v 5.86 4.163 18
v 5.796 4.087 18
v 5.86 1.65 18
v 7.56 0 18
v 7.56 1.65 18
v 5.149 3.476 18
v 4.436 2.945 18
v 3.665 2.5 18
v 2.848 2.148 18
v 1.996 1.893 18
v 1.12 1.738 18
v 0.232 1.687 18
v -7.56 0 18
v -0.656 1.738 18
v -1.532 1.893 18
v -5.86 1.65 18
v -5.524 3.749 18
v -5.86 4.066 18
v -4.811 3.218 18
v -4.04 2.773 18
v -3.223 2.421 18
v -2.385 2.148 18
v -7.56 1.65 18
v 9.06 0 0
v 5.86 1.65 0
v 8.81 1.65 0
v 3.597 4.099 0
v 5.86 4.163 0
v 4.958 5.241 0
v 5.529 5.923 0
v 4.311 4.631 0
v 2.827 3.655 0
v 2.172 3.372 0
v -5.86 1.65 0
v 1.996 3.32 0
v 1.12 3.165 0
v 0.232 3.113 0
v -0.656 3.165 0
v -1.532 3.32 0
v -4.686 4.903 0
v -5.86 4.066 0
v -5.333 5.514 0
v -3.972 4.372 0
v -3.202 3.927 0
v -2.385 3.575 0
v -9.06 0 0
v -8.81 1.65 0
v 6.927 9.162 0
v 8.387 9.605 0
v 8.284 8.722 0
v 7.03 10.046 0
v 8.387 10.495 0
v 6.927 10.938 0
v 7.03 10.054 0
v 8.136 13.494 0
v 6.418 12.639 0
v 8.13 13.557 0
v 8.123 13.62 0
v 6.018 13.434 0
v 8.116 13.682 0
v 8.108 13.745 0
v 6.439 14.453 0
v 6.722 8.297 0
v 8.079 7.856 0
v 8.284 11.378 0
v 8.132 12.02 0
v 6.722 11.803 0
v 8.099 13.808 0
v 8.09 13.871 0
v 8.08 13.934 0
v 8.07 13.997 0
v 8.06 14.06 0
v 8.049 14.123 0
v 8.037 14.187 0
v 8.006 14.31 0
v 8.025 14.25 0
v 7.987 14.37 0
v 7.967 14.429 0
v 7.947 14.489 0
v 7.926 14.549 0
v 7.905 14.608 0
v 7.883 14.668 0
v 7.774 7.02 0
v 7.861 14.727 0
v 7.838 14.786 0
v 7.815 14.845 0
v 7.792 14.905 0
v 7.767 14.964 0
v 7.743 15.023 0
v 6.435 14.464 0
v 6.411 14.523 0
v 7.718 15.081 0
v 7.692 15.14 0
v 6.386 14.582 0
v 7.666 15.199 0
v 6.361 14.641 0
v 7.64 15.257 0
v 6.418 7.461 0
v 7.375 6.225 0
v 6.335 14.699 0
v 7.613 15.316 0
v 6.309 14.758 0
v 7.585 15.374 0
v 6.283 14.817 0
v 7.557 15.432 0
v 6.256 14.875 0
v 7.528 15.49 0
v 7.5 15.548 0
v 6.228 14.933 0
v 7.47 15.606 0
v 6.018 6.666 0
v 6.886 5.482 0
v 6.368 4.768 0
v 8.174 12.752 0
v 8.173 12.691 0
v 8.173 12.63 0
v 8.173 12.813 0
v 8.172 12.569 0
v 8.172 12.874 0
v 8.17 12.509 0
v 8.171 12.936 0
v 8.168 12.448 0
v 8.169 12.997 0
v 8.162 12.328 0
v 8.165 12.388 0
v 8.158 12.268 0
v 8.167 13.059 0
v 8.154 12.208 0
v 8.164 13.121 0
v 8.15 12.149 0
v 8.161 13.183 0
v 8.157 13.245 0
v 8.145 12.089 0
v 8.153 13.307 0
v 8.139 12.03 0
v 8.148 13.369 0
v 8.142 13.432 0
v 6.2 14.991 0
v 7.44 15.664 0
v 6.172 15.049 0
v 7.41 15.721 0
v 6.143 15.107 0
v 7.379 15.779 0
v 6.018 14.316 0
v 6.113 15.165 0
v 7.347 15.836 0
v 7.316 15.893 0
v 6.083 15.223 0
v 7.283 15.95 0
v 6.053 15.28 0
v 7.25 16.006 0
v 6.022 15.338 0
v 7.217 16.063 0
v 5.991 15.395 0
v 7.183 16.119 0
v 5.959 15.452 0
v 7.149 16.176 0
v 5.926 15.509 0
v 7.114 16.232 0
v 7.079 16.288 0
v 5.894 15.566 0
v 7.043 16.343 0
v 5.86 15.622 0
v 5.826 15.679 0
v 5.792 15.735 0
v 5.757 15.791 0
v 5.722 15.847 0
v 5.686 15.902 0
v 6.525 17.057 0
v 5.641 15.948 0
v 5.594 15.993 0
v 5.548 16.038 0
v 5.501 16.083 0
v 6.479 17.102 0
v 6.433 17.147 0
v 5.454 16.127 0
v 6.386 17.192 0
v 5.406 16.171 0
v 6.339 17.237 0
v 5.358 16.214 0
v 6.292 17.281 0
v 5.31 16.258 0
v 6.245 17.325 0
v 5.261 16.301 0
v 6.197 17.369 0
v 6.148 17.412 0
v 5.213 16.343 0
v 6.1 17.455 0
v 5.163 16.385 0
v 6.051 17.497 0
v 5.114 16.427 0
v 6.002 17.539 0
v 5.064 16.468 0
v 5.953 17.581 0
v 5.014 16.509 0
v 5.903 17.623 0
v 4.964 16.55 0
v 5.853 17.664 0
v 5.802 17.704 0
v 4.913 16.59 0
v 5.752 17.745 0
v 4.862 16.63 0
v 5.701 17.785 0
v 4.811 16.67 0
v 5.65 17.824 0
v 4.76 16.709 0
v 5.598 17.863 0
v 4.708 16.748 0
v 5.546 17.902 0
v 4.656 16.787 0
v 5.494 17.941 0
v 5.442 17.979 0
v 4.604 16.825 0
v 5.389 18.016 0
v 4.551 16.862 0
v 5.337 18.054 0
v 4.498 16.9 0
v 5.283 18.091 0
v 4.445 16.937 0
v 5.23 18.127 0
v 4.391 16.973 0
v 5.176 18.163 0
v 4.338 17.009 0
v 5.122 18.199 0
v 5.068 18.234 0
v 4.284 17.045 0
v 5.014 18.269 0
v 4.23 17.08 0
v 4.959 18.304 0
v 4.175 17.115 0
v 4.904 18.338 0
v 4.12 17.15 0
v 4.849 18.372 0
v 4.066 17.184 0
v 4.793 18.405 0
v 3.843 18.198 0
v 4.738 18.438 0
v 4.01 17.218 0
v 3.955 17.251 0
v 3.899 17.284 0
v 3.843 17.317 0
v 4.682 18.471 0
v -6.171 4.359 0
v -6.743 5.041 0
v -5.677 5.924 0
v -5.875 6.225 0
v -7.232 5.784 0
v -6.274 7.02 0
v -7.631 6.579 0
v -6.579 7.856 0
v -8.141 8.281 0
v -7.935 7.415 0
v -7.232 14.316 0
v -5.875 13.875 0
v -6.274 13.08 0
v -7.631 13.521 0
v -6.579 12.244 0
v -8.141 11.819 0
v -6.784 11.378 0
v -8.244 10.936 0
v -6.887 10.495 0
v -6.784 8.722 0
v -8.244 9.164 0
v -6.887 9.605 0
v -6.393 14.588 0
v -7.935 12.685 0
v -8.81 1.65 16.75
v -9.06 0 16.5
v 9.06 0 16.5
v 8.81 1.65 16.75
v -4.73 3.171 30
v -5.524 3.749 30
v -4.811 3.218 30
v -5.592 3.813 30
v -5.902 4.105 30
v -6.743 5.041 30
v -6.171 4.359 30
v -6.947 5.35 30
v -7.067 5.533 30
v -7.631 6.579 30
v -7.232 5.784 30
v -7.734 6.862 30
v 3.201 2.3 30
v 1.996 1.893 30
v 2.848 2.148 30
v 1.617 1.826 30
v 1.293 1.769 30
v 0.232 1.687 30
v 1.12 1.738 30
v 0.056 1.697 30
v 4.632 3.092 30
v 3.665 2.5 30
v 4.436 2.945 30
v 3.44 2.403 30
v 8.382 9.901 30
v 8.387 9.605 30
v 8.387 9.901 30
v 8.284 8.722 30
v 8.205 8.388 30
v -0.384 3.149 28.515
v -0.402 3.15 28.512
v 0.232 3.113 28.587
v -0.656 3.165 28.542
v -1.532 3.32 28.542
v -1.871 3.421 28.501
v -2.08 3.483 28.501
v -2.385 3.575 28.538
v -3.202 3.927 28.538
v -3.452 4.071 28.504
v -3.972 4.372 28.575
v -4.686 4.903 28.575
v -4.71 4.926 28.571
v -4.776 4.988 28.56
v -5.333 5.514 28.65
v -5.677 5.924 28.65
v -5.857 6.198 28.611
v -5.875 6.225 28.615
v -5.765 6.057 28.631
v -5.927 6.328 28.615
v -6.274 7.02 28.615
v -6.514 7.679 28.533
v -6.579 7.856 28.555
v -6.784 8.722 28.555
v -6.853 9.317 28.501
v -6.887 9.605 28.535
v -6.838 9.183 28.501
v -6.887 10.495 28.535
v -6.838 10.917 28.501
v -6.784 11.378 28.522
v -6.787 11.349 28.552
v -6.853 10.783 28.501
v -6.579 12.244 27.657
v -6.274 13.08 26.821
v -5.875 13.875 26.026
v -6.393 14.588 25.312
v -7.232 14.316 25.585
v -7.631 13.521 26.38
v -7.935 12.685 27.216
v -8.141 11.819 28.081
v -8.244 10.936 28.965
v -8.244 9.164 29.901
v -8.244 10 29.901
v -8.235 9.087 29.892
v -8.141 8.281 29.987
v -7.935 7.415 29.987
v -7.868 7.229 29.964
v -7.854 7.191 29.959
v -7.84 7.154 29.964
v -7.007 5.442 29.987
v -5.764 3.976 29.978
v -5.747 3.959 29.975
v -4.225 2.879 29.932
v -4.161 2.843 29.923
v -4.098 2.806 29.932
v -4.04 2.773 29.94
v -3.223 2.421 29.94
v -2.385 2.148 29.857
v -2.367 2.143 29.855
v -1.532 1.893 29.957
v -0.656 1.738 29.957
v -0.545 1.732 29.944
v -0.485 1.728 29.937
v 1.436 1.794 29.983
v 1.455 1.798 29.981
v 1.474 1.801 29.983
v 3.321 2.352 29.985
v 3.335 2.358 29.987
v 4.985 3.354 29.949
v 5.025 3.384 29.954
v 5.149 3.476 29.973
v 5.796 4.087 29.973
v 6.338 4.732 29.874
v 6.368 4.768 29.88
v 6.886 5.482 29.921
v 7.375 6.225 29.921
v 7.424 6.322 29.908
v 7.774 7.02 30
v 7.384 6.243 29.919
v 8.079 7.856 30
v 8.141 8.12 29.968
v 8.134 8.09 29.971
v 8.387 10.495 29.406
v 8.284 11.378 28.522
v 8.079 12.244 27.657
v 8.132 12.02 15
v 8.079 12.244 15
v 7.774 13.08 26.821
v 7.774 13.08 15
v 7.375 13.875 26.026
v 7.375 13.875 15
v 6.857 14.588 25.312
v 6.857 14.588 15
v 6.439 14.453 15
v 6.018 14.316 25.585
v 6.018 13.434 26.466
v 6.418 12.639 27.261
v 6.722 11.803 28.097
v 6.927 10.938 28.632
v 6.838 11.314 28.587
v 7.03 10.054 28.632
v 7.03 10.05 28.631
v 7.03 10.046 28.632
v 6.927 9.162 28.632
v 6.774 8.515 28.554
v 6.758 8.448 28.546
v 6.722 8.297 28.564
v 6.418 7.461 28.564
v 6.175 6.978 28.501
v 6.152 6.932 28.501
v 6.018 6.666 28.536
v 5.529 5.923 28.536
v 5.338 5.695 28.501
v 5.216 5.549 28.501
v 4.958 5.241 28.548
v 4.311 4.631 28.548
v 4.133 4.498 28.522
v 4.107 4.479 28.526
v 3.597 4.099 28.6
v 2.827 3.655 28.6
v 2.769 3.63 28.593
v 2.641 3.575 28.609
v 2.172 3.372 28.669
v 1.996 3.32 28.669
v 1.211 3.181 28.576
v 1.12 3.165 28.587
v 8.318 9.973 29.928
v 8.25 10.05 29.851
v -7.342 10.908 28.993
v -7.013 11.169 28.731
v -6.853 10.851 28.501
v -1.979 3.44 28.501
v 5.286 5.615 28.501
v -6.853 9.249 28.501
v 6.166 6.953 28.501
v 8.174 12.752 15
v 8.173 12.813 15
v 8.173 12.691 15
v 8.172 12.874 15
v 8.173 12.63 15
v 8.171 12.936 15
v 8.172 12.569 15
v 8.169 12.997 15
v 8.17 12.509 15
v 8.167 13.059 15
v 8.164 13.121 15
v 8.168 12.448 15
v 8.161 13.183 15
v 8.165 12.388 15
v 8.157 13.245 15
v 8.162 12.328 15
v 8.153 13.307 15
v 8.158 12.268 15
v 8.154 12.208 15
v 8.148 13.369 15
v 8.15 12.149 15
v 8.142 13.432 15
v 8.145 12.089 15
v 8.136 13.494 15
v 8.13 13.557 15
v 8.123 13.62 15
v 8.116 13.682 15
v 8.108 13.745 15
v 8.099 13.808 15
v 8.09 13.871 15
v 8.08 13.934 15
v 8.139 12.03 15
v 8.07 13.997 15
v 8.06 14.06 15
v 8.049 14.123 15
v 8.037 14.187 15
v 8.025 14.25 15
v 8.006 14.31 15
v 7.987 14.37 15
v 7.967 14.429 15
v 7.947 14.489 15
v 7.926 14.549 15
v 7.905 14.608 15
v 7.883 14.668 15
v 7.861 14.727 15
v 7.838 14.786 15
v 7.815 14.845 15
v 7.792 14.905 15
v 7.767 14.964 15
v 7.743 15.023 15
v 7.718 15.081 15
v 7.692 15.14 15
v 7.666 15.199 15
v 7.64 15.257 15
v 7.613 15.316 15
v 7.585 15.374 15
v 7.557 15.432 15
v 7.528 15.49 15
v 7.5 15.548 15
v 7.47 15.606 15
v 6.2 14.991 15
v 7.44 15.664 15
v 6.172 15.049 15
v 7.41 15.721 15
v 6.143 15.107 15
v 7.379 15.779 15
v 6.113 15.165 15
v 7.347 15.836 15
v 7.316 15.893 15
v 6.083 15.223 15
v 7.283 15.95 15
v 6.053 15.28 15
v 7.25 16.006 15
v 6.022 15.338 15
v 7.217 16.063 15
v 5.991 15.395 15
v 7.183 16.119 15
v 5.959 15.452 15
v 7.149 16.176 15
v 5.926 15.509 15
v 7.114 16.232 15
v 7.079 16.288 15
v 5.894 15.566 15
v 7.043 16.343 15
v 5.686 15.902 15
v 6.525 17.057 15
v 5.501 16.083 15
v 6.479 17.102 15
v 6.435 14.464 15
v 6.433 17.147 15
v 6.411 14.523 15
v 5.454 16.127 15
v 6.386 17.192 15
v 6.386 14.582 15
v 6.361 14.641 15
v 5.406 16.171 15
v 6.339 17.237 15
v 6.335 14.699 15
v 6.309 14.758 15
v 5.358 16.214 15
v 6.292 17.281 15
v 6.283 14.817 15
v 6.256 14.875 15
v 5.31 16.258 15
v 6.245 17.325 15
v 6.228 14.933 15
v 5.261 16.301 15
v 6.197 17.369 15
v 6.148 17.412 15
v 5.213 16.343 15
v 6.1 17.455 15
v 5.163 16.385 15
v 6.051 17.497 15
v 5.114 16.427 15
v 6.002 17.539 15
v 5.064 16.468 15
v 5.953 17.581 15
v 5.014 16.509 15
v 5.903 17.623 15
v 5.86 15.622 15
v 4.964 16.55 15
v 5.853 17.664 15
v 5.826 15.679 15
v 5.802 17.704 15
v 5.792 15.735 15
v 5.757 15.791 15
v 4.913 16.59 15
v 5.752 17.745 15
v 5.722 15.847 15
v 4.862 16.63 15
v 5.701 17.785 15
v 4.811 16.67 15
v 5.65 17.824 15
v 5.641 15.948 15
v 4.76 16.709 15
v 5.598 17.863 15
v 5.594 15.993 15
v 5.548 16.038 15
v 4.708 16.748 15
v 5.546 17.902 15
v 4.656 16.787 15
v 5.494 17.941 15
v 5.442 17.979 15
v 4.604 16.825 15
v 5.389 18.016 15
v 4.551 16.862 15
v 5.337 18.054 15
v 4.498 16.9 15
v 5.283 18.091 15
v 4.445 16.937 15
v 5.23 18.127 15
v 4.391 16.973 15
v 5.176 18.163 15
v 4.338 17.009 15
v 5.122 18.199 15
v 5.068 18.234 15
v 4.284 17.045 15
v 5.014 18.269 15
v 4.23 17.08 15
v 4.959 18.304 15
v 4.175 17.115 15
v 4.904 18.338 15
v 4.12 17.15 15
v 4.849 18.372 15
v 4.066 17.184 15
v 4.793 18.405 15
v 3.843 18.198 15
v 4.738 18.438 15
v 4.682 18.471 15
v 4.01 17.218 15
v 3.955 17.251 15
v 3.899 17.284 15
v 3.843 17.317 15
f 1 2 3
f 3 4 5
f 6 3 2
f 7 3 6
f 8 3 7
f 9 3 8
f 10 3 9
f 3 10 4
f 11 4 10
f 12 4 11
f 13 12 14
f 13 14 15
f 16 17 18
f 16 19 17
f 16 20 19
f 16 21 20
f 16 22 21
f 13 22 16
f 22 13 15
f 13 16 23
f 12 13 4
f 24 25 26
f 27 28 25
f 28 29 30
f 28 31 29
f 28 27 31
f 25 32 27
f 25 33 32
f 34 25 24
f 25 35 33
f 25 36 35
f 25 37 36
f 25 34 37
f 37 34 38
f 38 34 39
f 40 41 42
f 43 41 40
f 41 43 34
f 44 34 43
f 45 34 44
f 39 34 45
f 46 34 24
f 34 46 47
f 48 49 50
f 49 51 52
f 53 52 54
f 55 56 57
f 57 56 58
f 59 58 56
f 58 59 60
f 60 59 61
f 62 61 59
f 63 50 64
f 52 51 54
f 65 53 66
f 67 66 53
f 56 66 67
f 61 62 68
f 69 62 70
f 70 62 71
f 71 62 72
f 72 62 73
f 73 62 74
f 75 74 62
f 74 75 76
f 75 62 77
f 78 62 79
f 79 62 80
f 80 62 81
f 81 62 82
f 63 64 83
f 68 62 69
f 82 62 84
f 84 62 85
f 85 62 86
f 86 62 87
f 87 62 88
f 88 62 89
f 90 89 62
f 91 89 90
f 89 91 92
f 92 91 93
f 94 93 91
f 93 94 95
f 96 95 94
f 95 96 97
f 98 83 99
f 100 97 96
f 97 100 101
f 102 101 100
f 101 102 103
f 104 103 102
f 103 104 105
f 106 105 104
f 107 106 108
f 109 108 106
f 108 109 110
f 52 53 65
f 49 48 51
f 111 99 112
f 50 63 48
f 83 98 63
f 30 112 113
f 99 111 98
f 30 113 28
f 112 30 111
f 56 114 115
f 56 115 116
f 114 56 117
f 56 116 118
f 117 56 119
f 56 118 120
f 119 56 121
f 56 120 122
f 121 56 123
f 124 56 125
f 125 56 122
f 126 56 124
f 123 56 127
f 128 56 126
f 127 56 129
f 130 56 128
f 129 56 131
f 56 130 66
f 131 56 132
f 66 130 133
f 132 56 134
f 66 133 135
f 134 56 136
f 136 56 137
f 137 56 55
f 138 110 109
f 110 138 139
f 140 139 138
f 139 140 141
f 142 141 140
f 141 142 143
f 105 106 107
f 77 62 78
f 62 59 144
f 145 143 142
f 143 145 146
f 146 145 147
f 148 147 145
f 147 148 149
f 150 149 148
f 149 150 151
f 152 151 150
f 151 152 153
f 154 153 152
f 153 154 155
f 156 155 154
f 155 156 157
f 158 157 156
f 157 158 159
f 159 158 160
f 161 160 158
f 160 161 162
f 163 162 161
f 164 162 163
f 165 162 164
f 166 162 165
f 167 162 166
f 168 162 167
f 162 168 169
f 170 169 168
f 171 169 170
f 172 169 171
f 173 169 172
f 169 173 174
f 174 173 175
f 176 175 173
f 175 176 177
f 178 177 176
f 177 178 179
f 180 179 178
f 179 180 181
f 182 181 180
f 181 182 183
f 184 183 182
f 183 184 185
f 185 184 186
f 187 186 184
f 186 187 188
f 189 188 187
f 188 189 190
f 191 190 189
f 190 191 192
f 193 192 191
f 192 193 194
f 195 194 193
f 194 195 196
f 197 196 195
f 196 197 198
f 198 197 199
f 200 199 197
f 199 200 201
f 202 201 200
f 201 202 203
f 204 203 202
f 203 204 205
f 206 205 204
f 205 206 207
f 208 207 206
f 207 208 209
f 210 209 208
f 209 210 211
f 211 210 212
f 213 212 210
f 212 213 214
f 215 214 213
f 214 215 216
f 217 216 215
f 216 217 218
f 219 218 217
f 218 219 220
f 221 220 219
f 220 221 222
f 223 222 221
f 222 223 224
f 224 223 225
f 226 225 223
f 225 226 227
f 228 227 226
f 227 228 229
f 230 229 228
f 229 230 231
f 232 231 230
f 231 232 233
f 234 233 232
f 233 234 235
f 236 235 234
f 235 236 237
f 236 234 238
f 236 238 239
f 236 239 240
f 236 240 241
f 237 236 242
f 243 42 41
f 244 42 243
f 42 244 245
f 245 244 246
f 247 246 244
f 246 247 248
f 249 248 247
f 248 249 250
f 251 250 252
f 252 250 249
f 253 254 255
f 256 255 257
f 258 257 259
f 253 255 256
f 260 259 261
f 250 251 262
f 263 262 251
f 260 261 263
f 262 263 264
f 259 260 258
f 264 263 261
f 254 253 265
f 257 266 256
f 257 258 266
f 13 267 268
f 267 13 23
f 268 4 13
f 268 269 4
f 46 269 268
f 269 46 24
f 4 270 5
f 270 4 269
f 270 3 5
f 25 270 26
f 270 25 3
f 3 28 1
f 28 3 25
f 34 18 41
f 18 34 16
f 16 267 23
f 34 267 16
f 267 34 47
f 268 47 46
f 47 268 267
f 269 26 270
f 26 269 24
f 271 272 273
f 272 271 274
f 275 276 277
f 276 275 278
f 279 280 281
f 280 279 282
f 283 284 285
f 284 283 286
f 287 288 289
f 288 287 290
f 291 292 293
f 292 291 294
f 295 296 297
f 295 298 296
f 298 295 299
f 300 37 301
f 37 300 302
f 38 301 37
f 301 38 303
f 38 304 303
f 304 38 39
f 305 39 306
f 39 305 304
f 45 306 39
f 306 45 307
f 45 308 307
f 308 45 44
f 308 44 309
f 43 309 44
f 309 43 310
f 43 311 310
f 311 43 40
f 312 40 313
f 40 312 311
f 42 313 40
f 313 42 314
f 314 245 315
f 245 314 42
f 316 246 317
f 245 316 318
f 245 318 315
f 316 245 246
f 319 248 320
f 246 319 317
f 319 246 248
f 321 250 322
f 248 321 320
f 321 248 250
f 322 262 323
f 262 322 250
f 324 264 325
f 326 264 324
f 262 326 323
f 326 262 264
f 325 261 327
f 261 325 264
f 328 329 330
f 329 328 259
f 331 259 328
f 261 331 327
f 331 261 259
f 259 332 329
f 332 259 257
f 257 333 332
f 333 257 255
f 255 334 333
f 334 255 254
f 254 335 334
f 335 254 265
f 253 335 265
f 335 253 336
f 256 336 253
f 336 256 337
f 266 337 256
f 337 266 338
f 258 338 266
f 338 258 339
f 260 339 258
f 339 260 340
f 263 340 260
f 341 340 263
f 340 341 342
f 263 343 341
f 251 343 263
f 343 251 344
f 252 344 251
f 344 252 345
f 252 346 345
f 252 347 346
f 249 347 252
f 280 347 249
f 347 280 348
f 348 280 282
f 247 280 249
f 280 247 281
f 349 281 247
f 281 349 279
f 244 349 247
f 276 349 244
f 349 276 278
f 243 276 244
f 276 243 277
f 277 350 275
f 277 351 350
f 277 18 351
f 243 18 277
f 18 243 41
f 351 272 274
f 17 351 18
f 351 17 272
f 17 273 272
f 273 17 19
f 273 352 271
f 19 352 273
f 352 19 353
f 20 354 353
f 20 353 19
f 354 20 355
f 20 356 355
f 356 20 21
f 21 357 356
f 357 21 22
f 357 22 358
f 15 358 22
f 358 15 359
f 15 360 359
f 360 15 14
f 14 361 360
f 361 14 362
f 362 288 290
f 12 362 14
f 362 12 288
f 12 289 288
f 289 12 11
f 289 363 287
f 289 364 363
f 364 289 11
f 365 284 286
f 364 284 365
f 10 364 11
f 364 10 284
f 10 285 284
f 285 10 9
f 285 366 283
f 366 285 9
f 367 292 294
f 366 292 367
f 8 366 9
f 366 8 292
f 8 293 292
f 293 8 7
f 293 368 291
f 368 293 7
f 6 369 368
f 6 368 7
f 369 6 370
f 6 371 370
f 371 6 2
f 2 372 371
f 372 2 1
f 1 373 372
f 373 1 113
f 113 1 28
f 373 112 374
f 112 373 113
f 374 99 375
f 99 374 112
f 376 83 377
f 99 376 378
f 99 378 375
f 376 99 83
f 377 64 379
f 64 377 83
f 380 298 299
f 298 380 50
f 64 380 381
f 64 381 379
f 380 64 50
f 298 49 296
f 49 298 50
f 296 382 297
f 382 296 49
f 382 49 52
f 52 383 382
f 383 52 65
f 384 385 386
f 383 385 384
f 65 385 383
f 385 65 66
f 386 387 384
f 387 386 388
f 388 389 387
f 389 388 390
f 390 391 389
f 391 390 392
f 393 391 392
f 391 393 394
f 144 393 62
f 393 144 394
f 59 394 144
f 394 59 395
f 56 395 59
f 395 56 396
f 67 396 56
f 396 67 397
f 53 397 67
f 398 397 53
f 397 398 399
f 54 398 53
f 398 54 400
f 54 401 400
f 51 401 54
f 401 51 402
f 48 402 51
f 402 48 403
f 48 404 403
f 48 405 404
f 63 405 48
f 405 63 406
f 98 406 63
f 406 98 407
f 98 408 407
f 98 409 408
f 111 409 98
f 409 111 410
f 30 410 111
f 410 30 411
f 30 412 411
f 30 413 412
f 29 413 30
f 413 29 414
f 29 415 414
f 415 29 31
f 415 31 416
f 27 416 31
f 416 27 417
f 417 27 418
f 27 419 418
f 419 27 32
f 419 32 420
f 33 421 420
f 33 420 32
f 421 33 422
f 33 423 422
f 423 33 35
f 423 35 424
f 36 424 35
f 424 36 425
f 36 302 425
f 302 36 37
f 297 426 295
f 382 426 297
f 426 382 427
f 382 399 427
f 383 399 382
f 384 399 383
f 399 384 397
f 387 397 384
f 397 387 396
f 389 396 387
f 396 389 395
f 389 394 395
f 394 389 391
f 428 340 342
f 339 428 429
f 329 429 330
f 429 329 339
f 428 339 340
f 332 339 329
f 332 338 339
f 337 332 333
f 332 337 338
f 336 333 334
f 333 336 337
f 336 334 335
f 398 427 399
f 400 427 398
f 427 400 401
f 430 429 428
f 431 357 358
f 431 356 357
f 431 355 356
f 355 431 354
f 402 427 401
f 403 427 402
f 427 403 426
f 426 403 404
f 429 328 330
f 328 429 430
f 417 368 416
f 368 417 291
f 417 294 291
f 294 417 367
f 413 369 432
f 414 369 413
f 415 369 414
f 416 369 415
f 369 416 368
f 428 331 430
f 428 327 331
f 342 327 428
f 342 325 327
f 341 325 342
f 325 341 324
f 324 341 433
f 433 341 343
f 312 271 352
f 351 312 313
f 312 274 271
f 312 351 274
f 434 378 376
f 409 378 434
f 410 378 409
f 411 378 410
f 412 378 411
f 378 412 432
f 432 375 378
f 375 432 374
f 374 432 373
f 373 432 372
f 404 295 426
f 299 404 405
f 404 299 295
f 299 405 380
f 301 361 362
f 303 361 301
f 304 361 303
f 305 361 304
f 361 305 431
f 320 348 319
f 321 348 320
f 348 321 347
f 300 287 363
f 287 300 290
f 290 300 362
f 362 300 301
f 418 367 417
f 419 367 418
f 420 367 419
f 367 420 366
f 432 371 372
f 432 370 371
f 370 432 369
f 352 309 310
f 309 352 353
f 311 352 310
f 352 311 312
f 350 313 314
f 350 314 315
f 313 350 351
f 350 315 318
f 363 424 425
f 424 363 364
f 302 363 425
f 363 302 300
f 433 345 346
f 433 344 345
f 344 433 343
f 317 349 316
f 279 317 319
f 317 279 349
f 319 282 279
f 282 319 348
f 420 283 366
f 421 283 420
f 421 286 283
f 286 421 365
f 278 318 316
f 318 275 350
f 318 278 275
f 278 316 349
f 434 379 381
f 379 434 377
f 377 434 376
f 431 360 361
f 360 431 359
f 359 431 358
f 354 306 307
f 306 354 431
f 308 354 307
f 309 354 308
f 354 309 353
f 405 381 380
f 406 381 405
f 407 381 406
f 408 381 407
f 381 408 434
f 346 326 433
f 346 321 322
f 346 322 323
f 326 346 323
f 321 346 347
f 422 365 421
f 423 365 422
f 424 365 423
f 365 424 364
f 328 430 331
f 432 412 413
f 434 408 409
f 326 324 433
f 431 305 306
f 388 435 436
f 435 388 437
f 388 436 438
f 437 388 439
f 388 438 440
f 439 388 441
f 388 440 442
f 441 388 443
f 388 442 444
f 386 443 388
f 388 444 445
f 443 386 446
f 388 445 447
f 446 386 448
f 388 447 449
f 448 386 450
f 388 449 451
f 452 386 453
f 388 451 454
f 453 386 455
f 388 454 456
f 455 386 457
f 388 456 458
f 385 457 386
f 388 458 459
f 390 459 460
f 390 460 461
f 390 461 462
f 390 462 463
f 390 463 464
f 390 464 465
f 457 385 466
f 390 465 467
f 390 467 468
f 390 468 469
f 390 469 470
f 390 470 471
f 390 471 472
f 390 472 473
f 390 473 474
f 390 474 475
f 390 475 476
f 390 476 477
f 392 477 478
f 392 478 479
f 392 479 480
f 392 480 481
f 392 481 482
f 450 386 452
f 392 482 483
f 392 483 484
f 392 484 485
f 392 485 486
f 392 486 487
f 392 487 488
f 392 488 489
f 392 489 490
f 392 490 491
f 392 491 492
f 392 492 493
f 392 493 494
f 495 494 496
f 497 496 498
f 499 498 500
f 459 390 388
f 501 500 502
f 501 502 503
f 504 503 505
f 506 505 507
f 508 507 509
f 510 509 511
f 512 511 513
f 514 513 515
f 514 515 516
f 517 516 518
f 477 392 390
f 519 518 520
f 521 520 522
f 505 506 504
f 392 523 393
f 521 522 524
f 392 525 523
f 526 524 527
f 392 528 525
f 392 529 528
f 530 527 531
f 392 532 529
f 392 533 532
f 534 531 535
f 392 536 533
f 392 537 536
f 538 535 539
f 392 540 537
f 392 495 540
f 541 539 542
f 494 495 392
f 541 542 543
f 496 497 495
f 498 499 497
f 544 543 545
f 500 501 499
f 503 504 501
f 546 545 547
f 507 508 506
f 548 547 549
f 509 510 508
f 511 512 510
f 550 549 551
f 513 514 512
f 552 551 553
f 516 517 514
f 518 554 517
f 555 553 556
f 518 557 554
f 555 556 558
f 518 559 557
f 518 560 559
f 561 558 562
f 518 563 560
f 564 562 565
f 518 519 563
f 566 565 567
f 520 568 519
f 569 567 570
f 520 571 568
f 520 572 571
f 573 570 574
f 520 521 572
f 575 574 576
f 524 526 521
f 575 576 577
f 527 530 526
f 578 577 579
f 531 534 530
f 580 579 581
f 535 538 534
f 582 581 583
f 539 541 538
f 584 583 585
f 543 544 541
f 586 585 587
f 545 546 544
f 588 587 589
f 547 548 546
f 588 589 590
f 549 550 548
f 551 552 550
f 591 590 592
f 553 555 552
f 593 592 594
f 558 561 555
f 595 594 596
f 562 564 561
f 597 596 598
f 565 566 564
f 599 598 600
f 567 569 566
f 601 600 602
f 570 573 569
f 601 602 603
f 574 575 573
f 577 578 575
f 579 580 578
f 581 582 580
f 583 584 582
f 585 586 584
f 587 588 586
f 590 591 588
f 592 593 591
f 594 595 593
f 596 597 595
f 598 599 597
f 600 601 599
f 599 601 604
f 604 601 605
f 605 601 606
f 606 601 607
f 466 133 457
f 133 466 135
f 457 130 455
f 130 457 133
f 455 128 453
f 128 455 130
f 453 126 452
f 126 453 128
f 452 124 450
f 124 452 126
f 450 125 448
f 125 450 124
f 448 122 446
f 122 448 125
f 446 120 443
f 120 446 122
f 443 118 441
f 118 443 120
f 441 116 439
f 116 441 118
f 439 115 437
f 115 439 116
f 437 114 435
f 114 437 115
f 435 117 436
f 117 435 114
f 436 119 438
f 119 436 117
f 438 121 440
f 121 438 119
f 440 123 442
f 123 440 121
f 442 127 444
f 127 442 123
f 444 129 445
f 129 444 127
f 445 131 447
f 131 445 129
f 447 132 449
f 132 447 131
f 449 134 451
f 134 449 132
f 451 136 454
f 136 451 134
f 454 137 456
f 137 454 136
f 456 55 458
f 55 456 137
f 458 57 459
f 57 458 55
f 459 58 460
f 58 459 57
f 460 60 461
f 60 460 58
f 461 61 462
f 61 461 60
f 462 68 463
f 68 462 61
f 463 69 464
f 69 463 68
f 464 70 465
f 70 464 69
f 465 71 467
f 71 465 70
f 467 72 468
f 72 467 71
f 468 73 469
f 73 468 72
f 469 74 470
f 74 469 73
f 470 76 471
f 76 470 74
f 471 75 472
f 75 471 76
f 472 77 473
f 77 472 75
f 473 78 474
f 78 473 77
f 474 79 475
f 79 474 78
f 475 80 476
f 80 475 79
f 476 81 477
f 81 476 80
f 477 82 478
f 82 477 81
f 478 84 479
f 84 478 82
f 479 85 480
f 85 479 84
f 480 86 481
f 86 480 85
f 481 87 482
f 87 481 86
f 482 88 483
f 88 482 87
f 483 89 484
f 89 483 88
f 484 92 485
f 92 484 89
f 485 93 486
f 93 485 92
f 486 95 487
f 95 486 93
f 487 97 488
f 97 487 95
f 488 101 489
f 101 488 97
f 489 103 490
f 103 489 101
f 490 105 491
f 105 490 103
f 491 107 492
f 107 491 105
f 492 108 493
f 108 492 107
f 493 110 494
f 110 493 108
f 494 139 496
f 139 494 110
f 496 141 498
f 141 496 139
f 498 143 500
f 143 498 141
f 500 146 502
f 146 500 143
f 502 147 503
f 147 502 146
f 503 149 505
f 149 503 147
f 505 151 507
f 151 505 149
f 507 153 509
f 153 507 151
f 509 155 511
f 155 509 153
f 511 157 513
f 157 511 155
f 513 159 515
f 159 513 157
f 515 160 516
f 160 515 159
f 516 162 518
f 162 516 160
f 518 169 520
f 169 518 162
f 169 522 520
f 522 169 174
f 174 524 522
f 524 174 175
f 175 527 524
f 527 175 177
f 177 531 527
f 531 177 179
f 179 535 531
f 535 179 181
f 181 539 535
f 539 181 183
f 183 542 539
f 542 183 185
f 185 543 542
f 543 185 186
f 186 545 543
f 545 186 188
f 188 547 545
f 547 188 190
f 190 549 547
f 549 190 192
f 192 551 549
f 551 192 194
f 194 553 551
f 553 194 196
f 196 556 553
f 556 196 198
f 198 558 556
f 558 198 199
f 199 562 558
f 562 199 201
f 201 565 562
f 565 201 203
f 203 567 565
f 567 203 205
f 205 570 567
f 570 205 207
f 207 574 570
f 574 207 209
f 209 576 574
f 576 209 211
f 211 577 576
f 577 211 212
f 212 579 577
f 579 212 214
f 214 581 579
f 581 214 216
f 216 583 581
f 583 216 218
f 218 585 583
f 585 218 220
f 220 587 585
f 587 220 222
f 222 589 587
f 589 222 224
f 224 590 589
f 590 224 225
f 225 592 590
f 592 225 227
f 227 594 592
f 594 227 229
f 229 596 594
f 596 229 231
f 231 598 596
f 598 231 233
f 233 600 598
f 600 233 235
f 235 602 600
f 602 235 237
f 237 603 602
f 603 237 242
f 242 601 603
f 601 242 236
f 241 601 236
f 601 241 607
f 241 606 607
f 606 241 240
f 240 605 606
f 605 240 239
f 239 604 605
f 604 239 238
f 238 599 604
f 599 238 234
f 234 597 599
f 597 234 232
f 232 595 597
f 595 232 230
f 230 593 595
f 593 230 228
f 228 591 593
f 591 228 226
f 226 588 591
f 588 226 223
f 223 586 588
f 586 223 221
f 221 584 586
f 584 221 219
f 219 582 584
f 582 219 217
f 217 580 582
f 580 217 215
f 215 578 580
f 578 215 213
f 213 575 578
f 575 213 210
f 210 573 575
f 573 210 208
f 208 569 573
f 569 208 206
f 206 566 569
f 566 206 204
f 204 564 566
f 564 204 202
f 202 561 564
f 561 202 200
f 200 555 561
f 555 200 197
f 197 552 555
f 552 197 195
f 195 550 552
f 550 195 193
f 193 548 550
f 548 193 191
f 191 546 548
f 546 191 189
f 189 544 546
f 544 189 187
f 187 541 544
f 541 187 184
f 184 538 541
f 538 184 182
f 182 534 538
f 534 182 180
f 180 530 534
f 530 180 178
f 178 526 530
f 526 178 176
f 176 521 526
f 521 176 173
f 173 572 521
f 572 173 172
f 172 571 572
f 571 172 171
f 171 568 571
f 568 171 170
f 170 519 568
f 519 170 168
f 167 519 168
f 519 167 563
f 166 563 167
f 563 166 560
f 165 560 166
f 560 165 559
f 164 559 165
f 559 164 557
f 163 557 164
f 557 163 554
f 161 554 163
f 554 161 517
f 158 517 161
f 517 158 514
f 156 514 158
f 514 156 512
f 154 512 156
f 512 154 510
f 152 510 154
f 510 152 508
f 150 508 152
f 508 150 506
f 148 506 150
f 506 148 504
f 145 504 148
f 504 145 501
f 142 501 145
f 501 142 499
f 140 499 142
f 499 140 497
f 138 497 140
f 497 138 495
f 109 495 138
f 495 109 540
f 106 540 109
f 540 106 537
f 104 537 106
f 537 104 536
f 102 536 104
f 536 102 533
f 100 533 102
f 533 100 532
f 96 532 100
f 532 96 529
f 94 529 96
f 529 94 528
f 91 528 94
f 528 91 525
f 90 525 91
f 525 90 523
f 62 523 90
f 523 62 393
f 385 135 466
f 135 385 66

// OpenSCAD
hotshoeWidth = 18.52-0.4;
hotshoeThickness = 1.95-0.3;
hotshoeLength = 18;
hotshoeInset = 3.2;
hotshoeTaper = 0.25;
hotshoeCorner = 1.5;   
   
clipLength = 30; 
clipWallThickness = 1.5;
clipOpeningAngle = 120;
laserDiameter = 13.8;
laserButtonStickout = 1.25;
laserButtonPresserArcAngle=30;

nudge = 0.001;    
    
module hotshoe(coverStickout = 2) {    
hotshoeProfile = [
    [-hotshoeWidth/2, 0],
    [-hotshoeWidth/2+hotshoeTaper, hotshoeThickness],
    [-hotshoeWidth/2+hotshoeInset, hotshoeThickness],
    [-hotshoeWidth/2+hotshoeInset, hotshoeThickness+coverStickout],
    [hotshoeWidth/2-hotshoeInset, hotshoeThickness+coverStickout],
    [hotshoeWidth/2-hotshoeInset, hotshoeThickness],
    [hotshoeWidth/2-hotshoeTaper, hotshoeThickness],
    [hotshoeWidth/2, 0] ];

    render(convexity=1)
    intersection() {
        rotate([0,0,180])
        rotate([90,0,0])
        linear_extrude(height=hotshoeThickness+coverStickout)
        polygon([[-hotshoeWidth/2,0],
            [-hotshoeWidth/2,hotshoeLength-hotshoeCorner],
            [-hotshoeWidth/2+hotshoeCorner,hotshoeLength],
            [hotshoeWidth/2-hotshoeCorner,hotshoeLength],
            [hotshoeWidth/2,hotshoeLength-hotshoeCorner],
            [hotshoeWidth/2,0]]);

        linear_extrude(height=hotshoeLength) polygon(hotshoeProfile);
    }
}

module spiralArc(startAngle=0, endAngle=360, startRadius=10, endRadius=10, thickness=5, precision=36) {
    for (i=[0:precision-1]) {
        t1=i/precision;
        t2=(i+1)/precision;
        angle1 = (1-t1)*startAngle + t1*endAngle;
        angle2 = (1-t2)*startAngle + t2*endAngle;
        r1 = thickness/2+(1-t1)*startRadius + t1*endRadius;
        r2 = thickness/2+(1-t2)*startRadius + t2*endRadius;
        hull() {
            translate(r1*[cos(angle1),sin(angle1)]) circle(d=thickness);
            translate(r2*[cos(angle2),sin(angle2)]) circle(d=thickness);
        }
    }
}

module clip() {
    render(convexity=5)
        translate([0,laserDiameter/2+clipWallThickness,0]) 
        
        difference() {
            linear_extrude(height=clipLength) 
                spiralArc(startRadius=laserDiameter/2,endRadius=laserDiameter/2,thickness=clipWallThickness,startAngle=90+clipOpeningAngle/2,endAngle=360+90-clipOpeningAngle/2);
            translate([0,laserDiameter*.85,clipLength]) rotate([-45,0,0])
            cube(center=true,laserDiameter+2*clipWallThickness);
    translate([0,0,clipLength-clipWallThickness+nudge]) cylinder(h=clipWallThickness,d1=laserDiameter,d2=laserDiameter+2*clipWallThickness);
       
        }
        translate([0,laserDiameter/2+clipWallThickness,0]) 
            linear_extrude(height=clipLength/2) {
            spiralArc(startRadius=laserDiameter/2,endRadius=laserDiameter/2+clipWallThickness/2,thickness=clipWallThickness,startAngle=90-clipOpeningAngle/2-laserButtonPresserArcAngle/2,endAngle=90-clipOpeningAngle/2);
            spiralArc(startRadius=laserDiameter/2+clipWallThickness/2,endRadius=laserDiameter/2+laserButtonStickout,thickness=clipWallThickness,startAngle=90-clipOpeningAngle/2,endAngle=90-clipOpeningAngle/2+laserButtonPresserArcAngle/2);
            spiralArc(startRadius=laserDiameter/2+laserButtonStickout,endRadius=laserDiameter/2+laserButtonStickout,thickness=clipWallThickness,startAngle=90-clipOpeningAngle/2+laserButtonPresserArcAngle/2,endAngle=90-clipOpeningAngle/2+laserButtonPresserArcAngle);
            }
}

render(convexity=3)
difference() {
    hotshoe(coverStickout = 5);
    translate([0,hotshoeThickness+laserDiameter/2+clipWallThickness,0])
    translate([0,0,-nudge]) 
        cylinder(h=clipLength+2*nudge,d=laserDiameter+clipWallThickness);
}
translate([0,hotshoeThickness,0])
clip();
